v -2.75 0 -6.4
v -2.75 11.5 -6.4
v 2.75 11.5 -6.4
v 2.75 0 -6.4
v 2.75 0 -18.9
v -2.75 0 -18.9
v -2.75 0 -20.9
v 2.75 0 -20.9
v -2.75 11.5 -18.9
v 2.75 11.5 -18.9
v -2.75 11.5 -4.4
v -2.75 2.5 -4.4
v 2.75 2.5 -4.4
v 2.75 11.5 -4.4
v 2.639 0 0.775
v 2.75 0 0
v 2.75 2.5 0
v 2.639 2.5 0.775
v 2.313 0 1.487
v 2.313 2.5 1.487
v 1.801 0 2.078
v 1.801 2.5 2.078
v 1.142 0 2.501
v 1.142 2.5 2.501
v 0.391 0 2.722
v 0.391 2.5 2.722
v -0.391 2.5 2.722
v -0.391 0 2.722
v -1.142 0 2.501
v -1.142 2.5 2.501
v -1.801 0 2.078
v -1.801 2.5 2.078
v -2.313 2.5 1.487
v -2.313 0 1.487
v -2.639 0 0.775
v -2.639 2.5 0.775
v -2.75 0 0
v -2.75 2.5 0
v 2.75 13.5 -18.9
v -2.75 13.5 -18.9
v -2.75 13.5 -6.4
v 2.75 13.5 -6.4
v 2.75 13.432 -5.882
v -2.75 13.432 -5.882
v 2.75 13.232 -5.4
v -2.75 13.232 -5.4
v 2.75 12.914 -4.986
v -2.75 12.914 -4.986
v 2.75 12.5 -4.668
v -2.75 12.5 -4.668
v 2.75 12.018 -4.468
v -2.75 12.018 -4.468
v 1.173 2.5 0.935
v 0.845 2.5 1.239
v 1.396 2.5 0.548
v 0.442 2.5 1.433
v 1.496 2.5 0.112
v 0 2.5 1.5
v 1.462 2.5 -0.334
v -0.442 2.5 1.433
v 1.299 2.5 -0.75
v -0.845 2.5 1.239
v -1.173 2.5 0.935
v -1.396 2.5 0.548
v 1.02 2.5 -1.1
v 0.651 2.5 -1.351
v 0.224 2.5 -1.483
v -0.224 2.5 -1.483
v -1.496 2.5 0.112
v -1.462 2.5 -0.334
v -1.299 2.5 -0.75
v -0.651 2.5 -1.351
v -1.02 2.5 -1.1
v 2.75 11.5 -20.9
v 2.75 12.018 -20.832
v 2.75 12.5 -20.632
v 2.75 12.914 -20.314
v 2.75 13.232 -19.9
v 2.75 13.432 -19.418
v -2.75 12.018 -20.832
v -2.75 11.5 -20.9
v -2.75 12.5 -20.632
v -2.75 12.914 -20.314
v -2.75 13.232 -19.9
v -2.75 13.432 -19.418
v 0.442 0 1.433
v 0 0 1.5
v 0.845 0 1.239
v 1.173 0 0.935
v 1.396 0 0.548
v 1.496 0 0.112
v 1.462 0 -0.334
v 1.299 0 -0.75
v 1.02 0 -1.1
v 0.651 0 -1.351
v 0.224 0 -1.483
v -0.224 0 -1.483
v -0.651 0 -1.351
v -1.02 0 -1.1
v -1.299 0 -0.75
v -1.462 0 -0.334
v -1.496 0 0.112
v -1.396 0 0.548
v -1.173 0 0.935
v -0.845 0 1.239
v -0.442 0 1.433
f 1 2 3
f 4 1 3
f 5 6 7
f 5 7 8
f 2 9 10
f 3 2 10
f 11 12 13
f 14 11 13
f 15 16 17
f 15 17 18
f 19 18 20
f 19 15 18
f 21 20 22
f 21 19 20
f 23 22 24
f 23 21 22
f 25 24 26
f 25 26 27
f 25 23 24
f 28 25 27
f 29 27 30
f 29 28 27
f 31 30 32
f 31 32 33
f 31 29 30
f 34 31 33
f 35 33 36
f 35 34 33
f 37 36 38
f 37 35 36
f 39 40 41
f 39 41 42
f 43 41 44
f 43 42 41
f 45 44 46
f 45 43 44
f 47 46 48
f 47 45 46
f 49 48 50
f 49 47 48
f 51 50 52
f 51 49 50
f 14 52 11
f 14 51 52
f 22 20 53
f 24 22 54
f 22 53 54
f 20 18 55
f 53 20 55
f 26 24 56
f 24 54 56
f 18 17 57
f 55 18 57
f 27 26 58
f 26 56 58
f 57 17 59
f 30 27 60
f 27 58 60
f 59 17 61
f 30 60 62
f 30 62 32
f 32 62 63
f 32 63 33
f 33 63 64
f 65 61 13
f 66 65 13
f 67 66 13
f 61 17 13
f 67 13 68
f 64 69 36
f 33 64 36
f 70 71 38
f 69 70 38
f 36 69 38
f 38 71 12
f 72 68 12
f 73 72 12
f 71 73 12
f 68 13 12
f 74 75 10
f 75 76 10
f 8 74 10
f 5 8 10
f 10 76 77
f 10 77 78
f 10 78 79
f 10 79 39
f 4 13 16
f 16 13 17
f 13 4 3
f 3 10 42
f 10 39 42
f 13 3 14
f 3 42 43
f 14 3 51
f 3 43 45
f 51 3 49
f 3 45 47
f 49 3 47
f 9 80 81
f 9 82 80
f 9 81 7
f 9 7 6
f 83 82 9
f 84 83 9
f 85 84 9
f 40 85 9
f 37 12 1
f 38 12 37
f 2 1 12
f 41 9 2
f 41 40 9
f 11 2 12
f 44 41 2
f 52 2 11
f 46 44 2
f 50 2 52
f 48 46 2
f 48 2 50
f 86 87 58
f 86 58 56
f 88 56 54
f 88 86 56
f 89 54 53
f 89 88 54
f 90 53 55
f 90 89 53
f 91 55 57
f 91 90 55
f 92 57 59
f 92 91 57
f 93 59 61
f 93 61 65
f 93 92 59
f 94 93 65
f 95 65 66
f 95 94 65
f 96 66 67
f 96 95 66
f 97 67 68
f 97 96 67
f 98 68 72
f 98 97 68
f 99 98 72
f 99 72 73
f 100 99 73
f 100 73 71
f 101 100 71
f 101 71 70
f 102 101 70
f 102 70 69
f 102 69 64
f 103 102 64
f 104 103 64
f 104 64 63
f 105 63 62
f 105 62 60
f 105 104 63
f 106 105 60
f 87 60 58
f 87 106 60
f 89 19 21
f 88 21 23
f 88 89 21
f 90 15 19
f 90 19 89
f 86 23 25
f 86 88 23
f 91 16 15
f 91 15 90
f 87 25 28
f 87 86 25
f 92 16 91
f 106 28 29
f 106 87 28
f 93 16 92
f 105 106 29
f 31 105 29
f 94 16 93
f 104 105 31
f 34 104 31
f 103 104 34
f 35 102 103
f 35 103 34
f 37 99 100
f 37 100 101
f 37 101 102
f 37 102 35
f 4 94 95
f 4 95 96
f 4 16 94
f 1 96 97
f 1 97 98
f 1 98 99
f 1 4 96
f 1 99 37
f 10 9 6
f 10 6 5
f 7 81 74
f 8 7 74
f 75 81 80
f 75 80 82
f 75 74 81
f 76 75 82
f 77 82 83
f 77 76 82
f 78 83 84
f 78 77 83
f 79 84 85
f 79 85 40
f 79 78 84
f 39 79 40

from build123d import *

# Parameters (mm, degrees)
SKETCH2_R           = 1.5
BOSS_EXTRUDE1_DEPTH = 2.5
SKETCH3_W           = 5.5
SKETCH3_H           = 2
BOSS_EXTRUDE2_DEPTH = 9
SKETCH4_W           = 5.5
SKETCH4_H           = 16.5
BOSS_EXTRUDE3_DEPTH = 2
SKETCH5_W           = 5.5
SKETCH5_H           = 2
BOSS_EXTRUDE4_DEPTH = 11.5
FILLET1_R           = 2


with BuildPart() as part:
    # Sketch2 → Boss-Extrude1 (new body)
    with BuildSketch(Plane(origin=(0, 0, 0), x_dir=(1, 0, 0), z_dir=(0, 1, 0))):
        with BuildLine():
            Line((-2.75, 0), (-2.75, 6.4))
            Line((-2.75, 6.4), (2.75, 6.4))
            Line((2.75, 6.4), (2.75, 0))
            ThreePointArc((2.75, 0), (0, -2.75), (-2.75, 0))
        make_face()
        with Locations(Location((0, 0, 0), (0, 0, 270))):
            Circle(SKETCH2_R, mode=Mode.SUBTRACT)
    extrude(amount=BOSS_EXTRUDE1_DEPTH)

    # Sketch3 → Boss-Extrude2 (add)
    with BuildSketch(Plane(origin=(0, 2.5, 0), x_dir=(1, 0, 0), z_dir=(0, 1, 0))):
        with Locations((0, 5.4)):
            Rectangle(SKETCH3_W, SKETCH3_H)
    extrude(amount=BOSS_EXTRUDE2_DEPTH)

    # Sketch4 → Boss-Extrude3 (add)
    with BuildSketch(Plane(origin=(0, 11.5, 0), x_dir=(1, 0, 0), z_dir=(0, 1, 0))):
        with Locations((0, 12.65)):
            Rectangle(SKETCH4_W, SKETCH4_H)
    extrude(amount=BOSS_EXTRUDE3_DEPTH)

    # Sketch5 → Boss-Extrude4 (add)
    with BuildSketch(Plane.XZ.offset(-11.5)):
        with Locations((0, -19.9)):
            Rectangle(SKETCH5_W, SKETCH5_H)
    extrude(amount=BOSS_EXTRUDE4_DEPTH)

    # Fillet1
    fillet1_edges = [part.edges().sort_by_distance(p)[0] for p in [
        (0, 13.5, -4.4),
        (0, 13.5, -20.9),
    ]]
    fillet(fillet1_edges, radius=FILLET1_R)


solid = part.part
